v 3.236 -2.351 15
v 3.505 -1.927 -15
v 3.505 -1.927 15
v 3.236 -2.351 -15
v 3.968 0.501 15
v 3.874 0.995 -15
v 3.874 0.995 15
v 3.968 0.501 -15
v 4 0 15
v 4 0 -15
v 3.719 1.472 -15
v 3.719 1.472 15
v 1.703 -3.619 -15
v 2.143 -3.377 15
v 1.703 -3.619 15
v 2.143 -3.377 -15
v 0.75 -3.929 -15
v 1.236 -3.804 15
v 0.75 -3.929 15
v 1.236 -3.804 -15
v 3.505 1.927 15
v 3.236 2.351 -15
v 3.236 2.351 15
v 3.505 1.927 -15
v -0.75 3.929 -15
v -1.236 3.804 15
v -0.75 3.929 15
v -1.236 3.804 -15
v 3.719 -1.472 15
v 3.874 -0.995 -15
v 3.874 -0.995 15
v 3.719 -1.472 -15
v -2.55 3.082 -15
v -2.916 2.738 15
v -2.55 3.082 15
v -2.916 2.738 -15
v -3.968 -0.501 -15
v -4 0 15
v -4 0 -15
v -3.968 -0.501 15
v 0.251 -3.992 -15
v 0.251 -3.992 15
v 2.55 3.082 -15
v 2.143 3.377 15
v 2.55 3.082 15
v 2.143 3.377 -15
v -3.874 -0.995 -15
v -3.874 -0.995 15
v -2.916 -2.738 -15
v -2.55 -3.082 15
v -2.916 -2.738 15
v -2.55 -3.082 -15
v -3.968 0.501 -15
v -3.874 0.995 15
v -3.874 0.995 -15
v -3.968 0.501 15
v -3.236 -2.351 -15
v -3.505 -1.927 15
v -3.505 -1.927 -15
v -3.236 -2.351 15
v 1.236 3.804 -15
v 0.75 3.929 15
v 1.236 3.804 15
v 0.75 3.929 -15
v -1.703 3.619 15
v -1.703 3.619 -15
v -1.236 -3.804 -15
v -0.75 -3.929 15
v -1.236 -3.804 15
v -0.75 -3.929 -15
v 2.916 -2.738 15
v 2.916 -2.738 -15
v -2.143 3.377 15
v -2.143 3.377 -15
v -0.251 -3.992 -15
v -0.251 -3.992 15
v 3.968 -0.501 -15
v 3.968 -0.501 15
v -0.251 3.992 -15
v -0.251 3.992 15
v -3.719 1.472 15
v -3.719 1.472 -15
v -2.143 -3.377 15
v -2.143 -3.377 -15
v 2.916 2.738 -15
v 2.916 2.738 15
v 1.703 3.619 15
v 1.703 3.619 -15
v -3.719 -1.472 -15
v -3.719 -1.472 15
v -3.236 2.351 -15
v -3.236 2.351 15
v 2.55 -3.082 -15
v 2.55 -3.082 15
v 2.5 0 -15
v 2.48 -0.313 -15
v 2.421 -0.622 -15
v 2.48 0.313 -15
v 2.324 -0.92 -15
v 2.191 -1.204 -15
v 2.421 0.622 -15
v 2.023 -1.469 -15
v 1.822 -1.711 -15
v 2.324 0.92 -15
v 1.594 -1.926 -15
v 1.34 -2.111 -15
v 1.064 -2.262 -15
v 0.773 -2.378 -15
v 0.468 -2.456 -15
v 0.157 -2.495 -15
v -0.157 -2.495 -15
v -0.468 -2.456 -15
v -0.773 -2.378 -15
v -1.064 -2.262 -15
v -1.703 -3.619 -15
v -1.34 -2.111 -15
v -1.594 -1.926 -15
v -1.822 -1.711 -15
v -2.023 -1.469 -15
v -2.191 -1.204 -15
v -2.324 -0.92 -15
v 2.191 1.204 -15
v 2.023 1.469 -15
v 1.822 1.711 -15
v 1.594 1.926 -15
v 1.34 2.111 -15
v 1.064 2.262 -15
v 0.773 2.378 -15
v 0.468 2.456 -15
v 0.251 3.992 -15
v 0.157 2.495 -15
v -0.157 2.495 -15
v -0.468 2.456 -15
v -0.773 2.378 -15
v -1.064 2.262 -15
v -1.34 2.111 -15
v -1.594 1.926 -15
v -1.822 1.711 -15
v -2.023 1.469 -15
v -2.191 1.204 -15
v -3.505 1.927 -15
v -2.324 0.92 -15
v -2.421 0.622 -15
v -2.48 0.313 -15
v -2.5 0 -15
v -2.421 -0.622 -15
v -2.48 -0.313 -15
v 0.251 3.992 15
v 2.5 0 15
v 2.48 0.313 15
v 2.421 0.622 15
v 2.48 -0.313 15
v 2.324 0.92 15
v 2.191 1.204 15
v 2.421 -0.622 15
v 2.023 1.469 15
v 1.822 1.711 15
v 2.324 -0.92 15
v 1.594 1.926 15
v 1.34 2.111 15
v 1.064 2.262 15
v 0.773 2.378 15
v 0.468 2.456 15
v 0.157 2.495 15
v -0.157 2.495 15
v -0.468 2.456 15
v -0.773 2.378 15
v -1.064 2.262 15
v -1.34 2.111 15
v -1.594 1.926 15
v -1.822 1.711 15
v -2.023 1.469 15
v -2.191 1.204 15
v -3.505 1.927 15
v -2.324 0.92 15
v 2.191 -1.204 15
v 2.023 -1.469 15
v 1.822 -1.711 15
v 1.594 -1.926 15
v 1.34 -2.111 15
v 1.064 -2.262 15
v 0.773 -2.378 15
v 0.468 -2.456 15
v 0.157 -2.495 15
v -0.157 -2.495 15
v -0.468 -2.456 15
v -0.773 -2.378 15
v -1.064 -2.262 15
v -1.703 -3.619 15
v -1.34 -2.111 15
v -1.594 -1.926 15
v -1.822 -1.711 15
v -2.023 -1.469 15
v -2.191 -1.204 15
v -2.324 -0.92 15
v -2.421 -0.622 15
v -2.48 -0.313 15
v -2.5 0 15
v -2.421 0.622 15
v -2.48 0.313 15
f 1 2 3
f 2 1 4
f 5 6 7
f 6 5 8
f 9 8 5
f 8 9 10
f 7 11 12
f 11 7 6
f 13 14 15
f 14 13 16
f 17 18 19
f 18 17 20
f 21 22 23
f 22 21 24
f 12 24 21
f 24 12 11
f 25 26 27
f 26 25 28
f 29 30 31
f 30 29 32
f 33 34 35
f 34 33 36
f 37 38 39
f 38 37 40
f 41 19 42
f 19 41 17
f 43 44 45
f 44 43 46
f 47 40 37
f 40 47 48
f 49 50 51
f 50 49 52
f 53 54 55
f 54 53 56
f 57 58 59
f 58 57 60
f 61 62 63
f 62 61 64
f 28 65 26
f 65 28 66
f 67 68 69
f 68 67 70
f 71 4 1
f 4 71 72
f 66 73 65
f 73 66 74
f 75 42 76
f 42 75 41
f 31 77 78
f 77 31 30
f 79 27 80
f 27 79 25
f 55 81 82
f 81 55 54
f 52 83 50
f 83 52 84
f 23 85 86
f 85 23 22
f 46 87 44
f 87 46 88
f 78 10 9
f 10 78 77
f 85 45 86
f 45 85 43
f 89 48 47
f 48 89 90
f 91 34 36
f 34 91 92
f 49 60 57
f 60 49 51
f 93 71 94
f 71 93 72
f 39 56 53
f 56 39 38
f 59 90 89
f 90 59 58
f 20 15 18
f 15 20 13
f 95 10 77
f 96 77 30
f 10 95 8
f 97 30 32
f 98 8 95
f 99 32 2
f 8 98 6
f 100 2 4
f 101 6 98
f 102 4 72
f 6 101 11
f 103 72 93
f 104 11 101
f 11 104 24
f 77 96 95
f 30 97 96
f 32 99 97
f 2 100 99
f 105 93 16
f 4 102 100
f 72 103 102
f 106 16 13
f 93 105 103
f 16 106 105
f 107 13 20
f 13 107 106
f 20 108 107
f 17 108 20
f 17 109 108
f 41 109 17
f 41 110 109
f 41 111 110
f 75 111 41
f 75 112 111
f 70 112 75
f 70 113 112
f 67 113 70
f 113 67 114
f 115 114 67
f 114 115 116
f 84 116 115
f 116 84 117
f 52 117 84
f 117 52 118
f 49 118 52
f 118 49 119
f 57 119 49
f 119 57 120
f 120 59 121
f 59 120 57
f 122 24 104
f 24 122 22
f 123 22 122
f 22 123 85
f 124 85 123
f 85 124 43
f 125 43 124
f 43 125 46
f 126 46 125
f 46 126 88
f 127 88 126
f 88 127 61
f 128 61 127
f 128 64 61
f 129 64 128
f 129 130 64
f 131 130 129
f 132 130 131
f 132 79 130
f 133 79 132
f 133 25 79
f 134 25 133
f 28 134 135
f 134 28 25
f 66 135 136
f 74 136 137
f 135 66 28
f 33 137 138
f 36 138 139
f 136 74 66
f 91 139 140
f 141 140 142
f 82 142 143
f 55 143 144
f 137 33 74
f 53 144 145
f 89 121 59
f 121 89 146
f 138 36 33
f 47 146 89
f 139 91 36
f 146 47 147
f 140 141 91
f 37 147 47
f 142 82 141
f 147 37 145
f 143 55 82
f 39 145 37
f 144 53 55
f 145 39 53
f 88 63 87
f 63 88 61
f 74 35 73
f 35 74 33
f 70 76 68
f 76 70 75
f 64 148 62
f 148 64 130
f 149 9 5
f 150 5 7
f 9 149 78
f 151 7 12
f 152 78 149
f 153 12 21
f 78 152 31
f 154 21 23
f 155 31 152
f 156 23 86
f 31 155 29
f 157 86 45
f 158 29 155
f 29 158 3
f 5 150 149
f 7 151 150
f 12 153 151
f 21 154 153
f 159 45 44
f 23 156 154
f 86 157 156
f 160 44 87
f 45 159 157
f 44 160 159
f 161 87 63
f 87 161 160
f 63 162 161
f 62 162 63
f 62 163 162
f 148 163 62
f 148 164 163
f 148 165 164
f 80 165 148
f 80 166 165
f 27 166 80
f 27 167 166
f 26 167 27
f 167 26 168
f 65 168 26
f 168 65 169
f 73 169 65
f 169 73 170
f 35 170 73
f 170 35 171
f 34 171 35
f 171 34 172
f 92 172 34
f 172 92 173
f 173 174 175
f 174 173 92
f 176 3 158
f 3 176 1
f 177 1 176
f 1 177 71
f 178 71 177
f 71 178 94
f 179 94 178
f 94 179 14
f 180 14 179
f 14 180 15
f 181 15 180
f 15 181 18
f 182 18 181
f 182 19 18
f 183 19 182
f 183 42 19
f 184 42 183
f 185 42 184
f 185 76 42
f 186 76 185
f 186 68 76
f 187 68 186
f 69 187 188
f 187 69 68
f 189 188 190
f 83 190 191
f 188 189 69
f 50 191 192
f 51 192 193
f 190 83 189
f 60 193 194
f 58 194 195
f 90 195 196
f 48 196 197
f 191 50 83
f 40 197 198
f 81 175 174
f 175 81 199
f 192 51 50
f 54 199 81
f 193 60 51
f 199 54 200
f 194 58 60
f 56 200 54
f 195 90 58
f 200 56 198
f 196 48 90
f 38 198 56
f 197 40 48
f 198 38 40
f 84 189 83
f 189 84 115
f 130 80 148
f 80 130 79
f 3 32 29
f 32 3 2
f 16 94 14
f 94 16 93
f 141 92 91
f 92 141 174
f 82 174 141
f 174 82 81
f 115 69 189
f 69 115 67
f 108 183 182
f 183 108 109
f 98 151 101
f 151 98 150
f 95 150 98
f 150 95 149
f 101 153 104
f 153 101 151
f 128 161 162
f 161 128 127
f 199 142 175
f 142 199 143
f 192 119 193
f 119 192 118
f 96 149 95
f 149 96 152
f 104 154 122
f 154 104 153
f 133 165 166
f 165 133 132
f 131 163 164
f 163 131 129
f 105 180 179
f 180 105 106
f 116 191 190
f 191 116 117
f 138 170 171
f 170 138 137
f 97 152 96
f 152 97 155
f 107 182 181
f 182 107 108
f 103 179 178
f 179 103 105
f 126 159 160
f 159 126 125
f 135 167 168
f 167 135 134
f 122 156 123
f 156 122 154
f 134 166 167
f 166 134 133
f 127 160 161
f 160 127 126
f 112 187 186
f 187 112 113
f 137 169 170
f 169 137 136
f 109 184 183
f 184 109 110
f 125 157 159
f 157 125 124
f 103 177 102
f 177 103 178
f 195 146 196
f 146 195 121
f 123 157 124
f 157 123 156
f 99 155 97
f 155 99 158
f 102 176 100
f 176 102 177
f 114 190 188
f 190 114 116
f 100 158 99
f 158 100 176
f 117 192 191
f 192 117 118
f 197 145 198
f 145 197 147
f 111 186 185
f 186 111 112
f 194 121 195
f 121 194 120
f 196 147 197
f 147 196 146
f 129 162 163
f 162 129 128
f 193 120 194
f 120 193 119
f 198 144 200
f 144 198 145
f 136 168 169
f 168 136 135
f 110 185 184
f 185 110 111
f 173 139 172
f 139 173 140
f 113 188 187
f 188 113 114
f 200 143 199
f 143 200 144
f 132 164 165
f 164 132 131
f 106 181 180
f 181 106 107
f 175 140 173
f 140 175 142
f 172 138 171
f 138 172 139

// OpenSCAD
$fn = 50;


difference() {
	union() {
		translate(v = [0, 0, -15.0000000000]) {
			cylinder(h = 30, r = 4.0000000000);
		}
	}
	union() {
		translate(v = [0, 0, -100.0000000000]) {
			cylinder(h = 200, r = 2.5000000000);
		}
	}
}
